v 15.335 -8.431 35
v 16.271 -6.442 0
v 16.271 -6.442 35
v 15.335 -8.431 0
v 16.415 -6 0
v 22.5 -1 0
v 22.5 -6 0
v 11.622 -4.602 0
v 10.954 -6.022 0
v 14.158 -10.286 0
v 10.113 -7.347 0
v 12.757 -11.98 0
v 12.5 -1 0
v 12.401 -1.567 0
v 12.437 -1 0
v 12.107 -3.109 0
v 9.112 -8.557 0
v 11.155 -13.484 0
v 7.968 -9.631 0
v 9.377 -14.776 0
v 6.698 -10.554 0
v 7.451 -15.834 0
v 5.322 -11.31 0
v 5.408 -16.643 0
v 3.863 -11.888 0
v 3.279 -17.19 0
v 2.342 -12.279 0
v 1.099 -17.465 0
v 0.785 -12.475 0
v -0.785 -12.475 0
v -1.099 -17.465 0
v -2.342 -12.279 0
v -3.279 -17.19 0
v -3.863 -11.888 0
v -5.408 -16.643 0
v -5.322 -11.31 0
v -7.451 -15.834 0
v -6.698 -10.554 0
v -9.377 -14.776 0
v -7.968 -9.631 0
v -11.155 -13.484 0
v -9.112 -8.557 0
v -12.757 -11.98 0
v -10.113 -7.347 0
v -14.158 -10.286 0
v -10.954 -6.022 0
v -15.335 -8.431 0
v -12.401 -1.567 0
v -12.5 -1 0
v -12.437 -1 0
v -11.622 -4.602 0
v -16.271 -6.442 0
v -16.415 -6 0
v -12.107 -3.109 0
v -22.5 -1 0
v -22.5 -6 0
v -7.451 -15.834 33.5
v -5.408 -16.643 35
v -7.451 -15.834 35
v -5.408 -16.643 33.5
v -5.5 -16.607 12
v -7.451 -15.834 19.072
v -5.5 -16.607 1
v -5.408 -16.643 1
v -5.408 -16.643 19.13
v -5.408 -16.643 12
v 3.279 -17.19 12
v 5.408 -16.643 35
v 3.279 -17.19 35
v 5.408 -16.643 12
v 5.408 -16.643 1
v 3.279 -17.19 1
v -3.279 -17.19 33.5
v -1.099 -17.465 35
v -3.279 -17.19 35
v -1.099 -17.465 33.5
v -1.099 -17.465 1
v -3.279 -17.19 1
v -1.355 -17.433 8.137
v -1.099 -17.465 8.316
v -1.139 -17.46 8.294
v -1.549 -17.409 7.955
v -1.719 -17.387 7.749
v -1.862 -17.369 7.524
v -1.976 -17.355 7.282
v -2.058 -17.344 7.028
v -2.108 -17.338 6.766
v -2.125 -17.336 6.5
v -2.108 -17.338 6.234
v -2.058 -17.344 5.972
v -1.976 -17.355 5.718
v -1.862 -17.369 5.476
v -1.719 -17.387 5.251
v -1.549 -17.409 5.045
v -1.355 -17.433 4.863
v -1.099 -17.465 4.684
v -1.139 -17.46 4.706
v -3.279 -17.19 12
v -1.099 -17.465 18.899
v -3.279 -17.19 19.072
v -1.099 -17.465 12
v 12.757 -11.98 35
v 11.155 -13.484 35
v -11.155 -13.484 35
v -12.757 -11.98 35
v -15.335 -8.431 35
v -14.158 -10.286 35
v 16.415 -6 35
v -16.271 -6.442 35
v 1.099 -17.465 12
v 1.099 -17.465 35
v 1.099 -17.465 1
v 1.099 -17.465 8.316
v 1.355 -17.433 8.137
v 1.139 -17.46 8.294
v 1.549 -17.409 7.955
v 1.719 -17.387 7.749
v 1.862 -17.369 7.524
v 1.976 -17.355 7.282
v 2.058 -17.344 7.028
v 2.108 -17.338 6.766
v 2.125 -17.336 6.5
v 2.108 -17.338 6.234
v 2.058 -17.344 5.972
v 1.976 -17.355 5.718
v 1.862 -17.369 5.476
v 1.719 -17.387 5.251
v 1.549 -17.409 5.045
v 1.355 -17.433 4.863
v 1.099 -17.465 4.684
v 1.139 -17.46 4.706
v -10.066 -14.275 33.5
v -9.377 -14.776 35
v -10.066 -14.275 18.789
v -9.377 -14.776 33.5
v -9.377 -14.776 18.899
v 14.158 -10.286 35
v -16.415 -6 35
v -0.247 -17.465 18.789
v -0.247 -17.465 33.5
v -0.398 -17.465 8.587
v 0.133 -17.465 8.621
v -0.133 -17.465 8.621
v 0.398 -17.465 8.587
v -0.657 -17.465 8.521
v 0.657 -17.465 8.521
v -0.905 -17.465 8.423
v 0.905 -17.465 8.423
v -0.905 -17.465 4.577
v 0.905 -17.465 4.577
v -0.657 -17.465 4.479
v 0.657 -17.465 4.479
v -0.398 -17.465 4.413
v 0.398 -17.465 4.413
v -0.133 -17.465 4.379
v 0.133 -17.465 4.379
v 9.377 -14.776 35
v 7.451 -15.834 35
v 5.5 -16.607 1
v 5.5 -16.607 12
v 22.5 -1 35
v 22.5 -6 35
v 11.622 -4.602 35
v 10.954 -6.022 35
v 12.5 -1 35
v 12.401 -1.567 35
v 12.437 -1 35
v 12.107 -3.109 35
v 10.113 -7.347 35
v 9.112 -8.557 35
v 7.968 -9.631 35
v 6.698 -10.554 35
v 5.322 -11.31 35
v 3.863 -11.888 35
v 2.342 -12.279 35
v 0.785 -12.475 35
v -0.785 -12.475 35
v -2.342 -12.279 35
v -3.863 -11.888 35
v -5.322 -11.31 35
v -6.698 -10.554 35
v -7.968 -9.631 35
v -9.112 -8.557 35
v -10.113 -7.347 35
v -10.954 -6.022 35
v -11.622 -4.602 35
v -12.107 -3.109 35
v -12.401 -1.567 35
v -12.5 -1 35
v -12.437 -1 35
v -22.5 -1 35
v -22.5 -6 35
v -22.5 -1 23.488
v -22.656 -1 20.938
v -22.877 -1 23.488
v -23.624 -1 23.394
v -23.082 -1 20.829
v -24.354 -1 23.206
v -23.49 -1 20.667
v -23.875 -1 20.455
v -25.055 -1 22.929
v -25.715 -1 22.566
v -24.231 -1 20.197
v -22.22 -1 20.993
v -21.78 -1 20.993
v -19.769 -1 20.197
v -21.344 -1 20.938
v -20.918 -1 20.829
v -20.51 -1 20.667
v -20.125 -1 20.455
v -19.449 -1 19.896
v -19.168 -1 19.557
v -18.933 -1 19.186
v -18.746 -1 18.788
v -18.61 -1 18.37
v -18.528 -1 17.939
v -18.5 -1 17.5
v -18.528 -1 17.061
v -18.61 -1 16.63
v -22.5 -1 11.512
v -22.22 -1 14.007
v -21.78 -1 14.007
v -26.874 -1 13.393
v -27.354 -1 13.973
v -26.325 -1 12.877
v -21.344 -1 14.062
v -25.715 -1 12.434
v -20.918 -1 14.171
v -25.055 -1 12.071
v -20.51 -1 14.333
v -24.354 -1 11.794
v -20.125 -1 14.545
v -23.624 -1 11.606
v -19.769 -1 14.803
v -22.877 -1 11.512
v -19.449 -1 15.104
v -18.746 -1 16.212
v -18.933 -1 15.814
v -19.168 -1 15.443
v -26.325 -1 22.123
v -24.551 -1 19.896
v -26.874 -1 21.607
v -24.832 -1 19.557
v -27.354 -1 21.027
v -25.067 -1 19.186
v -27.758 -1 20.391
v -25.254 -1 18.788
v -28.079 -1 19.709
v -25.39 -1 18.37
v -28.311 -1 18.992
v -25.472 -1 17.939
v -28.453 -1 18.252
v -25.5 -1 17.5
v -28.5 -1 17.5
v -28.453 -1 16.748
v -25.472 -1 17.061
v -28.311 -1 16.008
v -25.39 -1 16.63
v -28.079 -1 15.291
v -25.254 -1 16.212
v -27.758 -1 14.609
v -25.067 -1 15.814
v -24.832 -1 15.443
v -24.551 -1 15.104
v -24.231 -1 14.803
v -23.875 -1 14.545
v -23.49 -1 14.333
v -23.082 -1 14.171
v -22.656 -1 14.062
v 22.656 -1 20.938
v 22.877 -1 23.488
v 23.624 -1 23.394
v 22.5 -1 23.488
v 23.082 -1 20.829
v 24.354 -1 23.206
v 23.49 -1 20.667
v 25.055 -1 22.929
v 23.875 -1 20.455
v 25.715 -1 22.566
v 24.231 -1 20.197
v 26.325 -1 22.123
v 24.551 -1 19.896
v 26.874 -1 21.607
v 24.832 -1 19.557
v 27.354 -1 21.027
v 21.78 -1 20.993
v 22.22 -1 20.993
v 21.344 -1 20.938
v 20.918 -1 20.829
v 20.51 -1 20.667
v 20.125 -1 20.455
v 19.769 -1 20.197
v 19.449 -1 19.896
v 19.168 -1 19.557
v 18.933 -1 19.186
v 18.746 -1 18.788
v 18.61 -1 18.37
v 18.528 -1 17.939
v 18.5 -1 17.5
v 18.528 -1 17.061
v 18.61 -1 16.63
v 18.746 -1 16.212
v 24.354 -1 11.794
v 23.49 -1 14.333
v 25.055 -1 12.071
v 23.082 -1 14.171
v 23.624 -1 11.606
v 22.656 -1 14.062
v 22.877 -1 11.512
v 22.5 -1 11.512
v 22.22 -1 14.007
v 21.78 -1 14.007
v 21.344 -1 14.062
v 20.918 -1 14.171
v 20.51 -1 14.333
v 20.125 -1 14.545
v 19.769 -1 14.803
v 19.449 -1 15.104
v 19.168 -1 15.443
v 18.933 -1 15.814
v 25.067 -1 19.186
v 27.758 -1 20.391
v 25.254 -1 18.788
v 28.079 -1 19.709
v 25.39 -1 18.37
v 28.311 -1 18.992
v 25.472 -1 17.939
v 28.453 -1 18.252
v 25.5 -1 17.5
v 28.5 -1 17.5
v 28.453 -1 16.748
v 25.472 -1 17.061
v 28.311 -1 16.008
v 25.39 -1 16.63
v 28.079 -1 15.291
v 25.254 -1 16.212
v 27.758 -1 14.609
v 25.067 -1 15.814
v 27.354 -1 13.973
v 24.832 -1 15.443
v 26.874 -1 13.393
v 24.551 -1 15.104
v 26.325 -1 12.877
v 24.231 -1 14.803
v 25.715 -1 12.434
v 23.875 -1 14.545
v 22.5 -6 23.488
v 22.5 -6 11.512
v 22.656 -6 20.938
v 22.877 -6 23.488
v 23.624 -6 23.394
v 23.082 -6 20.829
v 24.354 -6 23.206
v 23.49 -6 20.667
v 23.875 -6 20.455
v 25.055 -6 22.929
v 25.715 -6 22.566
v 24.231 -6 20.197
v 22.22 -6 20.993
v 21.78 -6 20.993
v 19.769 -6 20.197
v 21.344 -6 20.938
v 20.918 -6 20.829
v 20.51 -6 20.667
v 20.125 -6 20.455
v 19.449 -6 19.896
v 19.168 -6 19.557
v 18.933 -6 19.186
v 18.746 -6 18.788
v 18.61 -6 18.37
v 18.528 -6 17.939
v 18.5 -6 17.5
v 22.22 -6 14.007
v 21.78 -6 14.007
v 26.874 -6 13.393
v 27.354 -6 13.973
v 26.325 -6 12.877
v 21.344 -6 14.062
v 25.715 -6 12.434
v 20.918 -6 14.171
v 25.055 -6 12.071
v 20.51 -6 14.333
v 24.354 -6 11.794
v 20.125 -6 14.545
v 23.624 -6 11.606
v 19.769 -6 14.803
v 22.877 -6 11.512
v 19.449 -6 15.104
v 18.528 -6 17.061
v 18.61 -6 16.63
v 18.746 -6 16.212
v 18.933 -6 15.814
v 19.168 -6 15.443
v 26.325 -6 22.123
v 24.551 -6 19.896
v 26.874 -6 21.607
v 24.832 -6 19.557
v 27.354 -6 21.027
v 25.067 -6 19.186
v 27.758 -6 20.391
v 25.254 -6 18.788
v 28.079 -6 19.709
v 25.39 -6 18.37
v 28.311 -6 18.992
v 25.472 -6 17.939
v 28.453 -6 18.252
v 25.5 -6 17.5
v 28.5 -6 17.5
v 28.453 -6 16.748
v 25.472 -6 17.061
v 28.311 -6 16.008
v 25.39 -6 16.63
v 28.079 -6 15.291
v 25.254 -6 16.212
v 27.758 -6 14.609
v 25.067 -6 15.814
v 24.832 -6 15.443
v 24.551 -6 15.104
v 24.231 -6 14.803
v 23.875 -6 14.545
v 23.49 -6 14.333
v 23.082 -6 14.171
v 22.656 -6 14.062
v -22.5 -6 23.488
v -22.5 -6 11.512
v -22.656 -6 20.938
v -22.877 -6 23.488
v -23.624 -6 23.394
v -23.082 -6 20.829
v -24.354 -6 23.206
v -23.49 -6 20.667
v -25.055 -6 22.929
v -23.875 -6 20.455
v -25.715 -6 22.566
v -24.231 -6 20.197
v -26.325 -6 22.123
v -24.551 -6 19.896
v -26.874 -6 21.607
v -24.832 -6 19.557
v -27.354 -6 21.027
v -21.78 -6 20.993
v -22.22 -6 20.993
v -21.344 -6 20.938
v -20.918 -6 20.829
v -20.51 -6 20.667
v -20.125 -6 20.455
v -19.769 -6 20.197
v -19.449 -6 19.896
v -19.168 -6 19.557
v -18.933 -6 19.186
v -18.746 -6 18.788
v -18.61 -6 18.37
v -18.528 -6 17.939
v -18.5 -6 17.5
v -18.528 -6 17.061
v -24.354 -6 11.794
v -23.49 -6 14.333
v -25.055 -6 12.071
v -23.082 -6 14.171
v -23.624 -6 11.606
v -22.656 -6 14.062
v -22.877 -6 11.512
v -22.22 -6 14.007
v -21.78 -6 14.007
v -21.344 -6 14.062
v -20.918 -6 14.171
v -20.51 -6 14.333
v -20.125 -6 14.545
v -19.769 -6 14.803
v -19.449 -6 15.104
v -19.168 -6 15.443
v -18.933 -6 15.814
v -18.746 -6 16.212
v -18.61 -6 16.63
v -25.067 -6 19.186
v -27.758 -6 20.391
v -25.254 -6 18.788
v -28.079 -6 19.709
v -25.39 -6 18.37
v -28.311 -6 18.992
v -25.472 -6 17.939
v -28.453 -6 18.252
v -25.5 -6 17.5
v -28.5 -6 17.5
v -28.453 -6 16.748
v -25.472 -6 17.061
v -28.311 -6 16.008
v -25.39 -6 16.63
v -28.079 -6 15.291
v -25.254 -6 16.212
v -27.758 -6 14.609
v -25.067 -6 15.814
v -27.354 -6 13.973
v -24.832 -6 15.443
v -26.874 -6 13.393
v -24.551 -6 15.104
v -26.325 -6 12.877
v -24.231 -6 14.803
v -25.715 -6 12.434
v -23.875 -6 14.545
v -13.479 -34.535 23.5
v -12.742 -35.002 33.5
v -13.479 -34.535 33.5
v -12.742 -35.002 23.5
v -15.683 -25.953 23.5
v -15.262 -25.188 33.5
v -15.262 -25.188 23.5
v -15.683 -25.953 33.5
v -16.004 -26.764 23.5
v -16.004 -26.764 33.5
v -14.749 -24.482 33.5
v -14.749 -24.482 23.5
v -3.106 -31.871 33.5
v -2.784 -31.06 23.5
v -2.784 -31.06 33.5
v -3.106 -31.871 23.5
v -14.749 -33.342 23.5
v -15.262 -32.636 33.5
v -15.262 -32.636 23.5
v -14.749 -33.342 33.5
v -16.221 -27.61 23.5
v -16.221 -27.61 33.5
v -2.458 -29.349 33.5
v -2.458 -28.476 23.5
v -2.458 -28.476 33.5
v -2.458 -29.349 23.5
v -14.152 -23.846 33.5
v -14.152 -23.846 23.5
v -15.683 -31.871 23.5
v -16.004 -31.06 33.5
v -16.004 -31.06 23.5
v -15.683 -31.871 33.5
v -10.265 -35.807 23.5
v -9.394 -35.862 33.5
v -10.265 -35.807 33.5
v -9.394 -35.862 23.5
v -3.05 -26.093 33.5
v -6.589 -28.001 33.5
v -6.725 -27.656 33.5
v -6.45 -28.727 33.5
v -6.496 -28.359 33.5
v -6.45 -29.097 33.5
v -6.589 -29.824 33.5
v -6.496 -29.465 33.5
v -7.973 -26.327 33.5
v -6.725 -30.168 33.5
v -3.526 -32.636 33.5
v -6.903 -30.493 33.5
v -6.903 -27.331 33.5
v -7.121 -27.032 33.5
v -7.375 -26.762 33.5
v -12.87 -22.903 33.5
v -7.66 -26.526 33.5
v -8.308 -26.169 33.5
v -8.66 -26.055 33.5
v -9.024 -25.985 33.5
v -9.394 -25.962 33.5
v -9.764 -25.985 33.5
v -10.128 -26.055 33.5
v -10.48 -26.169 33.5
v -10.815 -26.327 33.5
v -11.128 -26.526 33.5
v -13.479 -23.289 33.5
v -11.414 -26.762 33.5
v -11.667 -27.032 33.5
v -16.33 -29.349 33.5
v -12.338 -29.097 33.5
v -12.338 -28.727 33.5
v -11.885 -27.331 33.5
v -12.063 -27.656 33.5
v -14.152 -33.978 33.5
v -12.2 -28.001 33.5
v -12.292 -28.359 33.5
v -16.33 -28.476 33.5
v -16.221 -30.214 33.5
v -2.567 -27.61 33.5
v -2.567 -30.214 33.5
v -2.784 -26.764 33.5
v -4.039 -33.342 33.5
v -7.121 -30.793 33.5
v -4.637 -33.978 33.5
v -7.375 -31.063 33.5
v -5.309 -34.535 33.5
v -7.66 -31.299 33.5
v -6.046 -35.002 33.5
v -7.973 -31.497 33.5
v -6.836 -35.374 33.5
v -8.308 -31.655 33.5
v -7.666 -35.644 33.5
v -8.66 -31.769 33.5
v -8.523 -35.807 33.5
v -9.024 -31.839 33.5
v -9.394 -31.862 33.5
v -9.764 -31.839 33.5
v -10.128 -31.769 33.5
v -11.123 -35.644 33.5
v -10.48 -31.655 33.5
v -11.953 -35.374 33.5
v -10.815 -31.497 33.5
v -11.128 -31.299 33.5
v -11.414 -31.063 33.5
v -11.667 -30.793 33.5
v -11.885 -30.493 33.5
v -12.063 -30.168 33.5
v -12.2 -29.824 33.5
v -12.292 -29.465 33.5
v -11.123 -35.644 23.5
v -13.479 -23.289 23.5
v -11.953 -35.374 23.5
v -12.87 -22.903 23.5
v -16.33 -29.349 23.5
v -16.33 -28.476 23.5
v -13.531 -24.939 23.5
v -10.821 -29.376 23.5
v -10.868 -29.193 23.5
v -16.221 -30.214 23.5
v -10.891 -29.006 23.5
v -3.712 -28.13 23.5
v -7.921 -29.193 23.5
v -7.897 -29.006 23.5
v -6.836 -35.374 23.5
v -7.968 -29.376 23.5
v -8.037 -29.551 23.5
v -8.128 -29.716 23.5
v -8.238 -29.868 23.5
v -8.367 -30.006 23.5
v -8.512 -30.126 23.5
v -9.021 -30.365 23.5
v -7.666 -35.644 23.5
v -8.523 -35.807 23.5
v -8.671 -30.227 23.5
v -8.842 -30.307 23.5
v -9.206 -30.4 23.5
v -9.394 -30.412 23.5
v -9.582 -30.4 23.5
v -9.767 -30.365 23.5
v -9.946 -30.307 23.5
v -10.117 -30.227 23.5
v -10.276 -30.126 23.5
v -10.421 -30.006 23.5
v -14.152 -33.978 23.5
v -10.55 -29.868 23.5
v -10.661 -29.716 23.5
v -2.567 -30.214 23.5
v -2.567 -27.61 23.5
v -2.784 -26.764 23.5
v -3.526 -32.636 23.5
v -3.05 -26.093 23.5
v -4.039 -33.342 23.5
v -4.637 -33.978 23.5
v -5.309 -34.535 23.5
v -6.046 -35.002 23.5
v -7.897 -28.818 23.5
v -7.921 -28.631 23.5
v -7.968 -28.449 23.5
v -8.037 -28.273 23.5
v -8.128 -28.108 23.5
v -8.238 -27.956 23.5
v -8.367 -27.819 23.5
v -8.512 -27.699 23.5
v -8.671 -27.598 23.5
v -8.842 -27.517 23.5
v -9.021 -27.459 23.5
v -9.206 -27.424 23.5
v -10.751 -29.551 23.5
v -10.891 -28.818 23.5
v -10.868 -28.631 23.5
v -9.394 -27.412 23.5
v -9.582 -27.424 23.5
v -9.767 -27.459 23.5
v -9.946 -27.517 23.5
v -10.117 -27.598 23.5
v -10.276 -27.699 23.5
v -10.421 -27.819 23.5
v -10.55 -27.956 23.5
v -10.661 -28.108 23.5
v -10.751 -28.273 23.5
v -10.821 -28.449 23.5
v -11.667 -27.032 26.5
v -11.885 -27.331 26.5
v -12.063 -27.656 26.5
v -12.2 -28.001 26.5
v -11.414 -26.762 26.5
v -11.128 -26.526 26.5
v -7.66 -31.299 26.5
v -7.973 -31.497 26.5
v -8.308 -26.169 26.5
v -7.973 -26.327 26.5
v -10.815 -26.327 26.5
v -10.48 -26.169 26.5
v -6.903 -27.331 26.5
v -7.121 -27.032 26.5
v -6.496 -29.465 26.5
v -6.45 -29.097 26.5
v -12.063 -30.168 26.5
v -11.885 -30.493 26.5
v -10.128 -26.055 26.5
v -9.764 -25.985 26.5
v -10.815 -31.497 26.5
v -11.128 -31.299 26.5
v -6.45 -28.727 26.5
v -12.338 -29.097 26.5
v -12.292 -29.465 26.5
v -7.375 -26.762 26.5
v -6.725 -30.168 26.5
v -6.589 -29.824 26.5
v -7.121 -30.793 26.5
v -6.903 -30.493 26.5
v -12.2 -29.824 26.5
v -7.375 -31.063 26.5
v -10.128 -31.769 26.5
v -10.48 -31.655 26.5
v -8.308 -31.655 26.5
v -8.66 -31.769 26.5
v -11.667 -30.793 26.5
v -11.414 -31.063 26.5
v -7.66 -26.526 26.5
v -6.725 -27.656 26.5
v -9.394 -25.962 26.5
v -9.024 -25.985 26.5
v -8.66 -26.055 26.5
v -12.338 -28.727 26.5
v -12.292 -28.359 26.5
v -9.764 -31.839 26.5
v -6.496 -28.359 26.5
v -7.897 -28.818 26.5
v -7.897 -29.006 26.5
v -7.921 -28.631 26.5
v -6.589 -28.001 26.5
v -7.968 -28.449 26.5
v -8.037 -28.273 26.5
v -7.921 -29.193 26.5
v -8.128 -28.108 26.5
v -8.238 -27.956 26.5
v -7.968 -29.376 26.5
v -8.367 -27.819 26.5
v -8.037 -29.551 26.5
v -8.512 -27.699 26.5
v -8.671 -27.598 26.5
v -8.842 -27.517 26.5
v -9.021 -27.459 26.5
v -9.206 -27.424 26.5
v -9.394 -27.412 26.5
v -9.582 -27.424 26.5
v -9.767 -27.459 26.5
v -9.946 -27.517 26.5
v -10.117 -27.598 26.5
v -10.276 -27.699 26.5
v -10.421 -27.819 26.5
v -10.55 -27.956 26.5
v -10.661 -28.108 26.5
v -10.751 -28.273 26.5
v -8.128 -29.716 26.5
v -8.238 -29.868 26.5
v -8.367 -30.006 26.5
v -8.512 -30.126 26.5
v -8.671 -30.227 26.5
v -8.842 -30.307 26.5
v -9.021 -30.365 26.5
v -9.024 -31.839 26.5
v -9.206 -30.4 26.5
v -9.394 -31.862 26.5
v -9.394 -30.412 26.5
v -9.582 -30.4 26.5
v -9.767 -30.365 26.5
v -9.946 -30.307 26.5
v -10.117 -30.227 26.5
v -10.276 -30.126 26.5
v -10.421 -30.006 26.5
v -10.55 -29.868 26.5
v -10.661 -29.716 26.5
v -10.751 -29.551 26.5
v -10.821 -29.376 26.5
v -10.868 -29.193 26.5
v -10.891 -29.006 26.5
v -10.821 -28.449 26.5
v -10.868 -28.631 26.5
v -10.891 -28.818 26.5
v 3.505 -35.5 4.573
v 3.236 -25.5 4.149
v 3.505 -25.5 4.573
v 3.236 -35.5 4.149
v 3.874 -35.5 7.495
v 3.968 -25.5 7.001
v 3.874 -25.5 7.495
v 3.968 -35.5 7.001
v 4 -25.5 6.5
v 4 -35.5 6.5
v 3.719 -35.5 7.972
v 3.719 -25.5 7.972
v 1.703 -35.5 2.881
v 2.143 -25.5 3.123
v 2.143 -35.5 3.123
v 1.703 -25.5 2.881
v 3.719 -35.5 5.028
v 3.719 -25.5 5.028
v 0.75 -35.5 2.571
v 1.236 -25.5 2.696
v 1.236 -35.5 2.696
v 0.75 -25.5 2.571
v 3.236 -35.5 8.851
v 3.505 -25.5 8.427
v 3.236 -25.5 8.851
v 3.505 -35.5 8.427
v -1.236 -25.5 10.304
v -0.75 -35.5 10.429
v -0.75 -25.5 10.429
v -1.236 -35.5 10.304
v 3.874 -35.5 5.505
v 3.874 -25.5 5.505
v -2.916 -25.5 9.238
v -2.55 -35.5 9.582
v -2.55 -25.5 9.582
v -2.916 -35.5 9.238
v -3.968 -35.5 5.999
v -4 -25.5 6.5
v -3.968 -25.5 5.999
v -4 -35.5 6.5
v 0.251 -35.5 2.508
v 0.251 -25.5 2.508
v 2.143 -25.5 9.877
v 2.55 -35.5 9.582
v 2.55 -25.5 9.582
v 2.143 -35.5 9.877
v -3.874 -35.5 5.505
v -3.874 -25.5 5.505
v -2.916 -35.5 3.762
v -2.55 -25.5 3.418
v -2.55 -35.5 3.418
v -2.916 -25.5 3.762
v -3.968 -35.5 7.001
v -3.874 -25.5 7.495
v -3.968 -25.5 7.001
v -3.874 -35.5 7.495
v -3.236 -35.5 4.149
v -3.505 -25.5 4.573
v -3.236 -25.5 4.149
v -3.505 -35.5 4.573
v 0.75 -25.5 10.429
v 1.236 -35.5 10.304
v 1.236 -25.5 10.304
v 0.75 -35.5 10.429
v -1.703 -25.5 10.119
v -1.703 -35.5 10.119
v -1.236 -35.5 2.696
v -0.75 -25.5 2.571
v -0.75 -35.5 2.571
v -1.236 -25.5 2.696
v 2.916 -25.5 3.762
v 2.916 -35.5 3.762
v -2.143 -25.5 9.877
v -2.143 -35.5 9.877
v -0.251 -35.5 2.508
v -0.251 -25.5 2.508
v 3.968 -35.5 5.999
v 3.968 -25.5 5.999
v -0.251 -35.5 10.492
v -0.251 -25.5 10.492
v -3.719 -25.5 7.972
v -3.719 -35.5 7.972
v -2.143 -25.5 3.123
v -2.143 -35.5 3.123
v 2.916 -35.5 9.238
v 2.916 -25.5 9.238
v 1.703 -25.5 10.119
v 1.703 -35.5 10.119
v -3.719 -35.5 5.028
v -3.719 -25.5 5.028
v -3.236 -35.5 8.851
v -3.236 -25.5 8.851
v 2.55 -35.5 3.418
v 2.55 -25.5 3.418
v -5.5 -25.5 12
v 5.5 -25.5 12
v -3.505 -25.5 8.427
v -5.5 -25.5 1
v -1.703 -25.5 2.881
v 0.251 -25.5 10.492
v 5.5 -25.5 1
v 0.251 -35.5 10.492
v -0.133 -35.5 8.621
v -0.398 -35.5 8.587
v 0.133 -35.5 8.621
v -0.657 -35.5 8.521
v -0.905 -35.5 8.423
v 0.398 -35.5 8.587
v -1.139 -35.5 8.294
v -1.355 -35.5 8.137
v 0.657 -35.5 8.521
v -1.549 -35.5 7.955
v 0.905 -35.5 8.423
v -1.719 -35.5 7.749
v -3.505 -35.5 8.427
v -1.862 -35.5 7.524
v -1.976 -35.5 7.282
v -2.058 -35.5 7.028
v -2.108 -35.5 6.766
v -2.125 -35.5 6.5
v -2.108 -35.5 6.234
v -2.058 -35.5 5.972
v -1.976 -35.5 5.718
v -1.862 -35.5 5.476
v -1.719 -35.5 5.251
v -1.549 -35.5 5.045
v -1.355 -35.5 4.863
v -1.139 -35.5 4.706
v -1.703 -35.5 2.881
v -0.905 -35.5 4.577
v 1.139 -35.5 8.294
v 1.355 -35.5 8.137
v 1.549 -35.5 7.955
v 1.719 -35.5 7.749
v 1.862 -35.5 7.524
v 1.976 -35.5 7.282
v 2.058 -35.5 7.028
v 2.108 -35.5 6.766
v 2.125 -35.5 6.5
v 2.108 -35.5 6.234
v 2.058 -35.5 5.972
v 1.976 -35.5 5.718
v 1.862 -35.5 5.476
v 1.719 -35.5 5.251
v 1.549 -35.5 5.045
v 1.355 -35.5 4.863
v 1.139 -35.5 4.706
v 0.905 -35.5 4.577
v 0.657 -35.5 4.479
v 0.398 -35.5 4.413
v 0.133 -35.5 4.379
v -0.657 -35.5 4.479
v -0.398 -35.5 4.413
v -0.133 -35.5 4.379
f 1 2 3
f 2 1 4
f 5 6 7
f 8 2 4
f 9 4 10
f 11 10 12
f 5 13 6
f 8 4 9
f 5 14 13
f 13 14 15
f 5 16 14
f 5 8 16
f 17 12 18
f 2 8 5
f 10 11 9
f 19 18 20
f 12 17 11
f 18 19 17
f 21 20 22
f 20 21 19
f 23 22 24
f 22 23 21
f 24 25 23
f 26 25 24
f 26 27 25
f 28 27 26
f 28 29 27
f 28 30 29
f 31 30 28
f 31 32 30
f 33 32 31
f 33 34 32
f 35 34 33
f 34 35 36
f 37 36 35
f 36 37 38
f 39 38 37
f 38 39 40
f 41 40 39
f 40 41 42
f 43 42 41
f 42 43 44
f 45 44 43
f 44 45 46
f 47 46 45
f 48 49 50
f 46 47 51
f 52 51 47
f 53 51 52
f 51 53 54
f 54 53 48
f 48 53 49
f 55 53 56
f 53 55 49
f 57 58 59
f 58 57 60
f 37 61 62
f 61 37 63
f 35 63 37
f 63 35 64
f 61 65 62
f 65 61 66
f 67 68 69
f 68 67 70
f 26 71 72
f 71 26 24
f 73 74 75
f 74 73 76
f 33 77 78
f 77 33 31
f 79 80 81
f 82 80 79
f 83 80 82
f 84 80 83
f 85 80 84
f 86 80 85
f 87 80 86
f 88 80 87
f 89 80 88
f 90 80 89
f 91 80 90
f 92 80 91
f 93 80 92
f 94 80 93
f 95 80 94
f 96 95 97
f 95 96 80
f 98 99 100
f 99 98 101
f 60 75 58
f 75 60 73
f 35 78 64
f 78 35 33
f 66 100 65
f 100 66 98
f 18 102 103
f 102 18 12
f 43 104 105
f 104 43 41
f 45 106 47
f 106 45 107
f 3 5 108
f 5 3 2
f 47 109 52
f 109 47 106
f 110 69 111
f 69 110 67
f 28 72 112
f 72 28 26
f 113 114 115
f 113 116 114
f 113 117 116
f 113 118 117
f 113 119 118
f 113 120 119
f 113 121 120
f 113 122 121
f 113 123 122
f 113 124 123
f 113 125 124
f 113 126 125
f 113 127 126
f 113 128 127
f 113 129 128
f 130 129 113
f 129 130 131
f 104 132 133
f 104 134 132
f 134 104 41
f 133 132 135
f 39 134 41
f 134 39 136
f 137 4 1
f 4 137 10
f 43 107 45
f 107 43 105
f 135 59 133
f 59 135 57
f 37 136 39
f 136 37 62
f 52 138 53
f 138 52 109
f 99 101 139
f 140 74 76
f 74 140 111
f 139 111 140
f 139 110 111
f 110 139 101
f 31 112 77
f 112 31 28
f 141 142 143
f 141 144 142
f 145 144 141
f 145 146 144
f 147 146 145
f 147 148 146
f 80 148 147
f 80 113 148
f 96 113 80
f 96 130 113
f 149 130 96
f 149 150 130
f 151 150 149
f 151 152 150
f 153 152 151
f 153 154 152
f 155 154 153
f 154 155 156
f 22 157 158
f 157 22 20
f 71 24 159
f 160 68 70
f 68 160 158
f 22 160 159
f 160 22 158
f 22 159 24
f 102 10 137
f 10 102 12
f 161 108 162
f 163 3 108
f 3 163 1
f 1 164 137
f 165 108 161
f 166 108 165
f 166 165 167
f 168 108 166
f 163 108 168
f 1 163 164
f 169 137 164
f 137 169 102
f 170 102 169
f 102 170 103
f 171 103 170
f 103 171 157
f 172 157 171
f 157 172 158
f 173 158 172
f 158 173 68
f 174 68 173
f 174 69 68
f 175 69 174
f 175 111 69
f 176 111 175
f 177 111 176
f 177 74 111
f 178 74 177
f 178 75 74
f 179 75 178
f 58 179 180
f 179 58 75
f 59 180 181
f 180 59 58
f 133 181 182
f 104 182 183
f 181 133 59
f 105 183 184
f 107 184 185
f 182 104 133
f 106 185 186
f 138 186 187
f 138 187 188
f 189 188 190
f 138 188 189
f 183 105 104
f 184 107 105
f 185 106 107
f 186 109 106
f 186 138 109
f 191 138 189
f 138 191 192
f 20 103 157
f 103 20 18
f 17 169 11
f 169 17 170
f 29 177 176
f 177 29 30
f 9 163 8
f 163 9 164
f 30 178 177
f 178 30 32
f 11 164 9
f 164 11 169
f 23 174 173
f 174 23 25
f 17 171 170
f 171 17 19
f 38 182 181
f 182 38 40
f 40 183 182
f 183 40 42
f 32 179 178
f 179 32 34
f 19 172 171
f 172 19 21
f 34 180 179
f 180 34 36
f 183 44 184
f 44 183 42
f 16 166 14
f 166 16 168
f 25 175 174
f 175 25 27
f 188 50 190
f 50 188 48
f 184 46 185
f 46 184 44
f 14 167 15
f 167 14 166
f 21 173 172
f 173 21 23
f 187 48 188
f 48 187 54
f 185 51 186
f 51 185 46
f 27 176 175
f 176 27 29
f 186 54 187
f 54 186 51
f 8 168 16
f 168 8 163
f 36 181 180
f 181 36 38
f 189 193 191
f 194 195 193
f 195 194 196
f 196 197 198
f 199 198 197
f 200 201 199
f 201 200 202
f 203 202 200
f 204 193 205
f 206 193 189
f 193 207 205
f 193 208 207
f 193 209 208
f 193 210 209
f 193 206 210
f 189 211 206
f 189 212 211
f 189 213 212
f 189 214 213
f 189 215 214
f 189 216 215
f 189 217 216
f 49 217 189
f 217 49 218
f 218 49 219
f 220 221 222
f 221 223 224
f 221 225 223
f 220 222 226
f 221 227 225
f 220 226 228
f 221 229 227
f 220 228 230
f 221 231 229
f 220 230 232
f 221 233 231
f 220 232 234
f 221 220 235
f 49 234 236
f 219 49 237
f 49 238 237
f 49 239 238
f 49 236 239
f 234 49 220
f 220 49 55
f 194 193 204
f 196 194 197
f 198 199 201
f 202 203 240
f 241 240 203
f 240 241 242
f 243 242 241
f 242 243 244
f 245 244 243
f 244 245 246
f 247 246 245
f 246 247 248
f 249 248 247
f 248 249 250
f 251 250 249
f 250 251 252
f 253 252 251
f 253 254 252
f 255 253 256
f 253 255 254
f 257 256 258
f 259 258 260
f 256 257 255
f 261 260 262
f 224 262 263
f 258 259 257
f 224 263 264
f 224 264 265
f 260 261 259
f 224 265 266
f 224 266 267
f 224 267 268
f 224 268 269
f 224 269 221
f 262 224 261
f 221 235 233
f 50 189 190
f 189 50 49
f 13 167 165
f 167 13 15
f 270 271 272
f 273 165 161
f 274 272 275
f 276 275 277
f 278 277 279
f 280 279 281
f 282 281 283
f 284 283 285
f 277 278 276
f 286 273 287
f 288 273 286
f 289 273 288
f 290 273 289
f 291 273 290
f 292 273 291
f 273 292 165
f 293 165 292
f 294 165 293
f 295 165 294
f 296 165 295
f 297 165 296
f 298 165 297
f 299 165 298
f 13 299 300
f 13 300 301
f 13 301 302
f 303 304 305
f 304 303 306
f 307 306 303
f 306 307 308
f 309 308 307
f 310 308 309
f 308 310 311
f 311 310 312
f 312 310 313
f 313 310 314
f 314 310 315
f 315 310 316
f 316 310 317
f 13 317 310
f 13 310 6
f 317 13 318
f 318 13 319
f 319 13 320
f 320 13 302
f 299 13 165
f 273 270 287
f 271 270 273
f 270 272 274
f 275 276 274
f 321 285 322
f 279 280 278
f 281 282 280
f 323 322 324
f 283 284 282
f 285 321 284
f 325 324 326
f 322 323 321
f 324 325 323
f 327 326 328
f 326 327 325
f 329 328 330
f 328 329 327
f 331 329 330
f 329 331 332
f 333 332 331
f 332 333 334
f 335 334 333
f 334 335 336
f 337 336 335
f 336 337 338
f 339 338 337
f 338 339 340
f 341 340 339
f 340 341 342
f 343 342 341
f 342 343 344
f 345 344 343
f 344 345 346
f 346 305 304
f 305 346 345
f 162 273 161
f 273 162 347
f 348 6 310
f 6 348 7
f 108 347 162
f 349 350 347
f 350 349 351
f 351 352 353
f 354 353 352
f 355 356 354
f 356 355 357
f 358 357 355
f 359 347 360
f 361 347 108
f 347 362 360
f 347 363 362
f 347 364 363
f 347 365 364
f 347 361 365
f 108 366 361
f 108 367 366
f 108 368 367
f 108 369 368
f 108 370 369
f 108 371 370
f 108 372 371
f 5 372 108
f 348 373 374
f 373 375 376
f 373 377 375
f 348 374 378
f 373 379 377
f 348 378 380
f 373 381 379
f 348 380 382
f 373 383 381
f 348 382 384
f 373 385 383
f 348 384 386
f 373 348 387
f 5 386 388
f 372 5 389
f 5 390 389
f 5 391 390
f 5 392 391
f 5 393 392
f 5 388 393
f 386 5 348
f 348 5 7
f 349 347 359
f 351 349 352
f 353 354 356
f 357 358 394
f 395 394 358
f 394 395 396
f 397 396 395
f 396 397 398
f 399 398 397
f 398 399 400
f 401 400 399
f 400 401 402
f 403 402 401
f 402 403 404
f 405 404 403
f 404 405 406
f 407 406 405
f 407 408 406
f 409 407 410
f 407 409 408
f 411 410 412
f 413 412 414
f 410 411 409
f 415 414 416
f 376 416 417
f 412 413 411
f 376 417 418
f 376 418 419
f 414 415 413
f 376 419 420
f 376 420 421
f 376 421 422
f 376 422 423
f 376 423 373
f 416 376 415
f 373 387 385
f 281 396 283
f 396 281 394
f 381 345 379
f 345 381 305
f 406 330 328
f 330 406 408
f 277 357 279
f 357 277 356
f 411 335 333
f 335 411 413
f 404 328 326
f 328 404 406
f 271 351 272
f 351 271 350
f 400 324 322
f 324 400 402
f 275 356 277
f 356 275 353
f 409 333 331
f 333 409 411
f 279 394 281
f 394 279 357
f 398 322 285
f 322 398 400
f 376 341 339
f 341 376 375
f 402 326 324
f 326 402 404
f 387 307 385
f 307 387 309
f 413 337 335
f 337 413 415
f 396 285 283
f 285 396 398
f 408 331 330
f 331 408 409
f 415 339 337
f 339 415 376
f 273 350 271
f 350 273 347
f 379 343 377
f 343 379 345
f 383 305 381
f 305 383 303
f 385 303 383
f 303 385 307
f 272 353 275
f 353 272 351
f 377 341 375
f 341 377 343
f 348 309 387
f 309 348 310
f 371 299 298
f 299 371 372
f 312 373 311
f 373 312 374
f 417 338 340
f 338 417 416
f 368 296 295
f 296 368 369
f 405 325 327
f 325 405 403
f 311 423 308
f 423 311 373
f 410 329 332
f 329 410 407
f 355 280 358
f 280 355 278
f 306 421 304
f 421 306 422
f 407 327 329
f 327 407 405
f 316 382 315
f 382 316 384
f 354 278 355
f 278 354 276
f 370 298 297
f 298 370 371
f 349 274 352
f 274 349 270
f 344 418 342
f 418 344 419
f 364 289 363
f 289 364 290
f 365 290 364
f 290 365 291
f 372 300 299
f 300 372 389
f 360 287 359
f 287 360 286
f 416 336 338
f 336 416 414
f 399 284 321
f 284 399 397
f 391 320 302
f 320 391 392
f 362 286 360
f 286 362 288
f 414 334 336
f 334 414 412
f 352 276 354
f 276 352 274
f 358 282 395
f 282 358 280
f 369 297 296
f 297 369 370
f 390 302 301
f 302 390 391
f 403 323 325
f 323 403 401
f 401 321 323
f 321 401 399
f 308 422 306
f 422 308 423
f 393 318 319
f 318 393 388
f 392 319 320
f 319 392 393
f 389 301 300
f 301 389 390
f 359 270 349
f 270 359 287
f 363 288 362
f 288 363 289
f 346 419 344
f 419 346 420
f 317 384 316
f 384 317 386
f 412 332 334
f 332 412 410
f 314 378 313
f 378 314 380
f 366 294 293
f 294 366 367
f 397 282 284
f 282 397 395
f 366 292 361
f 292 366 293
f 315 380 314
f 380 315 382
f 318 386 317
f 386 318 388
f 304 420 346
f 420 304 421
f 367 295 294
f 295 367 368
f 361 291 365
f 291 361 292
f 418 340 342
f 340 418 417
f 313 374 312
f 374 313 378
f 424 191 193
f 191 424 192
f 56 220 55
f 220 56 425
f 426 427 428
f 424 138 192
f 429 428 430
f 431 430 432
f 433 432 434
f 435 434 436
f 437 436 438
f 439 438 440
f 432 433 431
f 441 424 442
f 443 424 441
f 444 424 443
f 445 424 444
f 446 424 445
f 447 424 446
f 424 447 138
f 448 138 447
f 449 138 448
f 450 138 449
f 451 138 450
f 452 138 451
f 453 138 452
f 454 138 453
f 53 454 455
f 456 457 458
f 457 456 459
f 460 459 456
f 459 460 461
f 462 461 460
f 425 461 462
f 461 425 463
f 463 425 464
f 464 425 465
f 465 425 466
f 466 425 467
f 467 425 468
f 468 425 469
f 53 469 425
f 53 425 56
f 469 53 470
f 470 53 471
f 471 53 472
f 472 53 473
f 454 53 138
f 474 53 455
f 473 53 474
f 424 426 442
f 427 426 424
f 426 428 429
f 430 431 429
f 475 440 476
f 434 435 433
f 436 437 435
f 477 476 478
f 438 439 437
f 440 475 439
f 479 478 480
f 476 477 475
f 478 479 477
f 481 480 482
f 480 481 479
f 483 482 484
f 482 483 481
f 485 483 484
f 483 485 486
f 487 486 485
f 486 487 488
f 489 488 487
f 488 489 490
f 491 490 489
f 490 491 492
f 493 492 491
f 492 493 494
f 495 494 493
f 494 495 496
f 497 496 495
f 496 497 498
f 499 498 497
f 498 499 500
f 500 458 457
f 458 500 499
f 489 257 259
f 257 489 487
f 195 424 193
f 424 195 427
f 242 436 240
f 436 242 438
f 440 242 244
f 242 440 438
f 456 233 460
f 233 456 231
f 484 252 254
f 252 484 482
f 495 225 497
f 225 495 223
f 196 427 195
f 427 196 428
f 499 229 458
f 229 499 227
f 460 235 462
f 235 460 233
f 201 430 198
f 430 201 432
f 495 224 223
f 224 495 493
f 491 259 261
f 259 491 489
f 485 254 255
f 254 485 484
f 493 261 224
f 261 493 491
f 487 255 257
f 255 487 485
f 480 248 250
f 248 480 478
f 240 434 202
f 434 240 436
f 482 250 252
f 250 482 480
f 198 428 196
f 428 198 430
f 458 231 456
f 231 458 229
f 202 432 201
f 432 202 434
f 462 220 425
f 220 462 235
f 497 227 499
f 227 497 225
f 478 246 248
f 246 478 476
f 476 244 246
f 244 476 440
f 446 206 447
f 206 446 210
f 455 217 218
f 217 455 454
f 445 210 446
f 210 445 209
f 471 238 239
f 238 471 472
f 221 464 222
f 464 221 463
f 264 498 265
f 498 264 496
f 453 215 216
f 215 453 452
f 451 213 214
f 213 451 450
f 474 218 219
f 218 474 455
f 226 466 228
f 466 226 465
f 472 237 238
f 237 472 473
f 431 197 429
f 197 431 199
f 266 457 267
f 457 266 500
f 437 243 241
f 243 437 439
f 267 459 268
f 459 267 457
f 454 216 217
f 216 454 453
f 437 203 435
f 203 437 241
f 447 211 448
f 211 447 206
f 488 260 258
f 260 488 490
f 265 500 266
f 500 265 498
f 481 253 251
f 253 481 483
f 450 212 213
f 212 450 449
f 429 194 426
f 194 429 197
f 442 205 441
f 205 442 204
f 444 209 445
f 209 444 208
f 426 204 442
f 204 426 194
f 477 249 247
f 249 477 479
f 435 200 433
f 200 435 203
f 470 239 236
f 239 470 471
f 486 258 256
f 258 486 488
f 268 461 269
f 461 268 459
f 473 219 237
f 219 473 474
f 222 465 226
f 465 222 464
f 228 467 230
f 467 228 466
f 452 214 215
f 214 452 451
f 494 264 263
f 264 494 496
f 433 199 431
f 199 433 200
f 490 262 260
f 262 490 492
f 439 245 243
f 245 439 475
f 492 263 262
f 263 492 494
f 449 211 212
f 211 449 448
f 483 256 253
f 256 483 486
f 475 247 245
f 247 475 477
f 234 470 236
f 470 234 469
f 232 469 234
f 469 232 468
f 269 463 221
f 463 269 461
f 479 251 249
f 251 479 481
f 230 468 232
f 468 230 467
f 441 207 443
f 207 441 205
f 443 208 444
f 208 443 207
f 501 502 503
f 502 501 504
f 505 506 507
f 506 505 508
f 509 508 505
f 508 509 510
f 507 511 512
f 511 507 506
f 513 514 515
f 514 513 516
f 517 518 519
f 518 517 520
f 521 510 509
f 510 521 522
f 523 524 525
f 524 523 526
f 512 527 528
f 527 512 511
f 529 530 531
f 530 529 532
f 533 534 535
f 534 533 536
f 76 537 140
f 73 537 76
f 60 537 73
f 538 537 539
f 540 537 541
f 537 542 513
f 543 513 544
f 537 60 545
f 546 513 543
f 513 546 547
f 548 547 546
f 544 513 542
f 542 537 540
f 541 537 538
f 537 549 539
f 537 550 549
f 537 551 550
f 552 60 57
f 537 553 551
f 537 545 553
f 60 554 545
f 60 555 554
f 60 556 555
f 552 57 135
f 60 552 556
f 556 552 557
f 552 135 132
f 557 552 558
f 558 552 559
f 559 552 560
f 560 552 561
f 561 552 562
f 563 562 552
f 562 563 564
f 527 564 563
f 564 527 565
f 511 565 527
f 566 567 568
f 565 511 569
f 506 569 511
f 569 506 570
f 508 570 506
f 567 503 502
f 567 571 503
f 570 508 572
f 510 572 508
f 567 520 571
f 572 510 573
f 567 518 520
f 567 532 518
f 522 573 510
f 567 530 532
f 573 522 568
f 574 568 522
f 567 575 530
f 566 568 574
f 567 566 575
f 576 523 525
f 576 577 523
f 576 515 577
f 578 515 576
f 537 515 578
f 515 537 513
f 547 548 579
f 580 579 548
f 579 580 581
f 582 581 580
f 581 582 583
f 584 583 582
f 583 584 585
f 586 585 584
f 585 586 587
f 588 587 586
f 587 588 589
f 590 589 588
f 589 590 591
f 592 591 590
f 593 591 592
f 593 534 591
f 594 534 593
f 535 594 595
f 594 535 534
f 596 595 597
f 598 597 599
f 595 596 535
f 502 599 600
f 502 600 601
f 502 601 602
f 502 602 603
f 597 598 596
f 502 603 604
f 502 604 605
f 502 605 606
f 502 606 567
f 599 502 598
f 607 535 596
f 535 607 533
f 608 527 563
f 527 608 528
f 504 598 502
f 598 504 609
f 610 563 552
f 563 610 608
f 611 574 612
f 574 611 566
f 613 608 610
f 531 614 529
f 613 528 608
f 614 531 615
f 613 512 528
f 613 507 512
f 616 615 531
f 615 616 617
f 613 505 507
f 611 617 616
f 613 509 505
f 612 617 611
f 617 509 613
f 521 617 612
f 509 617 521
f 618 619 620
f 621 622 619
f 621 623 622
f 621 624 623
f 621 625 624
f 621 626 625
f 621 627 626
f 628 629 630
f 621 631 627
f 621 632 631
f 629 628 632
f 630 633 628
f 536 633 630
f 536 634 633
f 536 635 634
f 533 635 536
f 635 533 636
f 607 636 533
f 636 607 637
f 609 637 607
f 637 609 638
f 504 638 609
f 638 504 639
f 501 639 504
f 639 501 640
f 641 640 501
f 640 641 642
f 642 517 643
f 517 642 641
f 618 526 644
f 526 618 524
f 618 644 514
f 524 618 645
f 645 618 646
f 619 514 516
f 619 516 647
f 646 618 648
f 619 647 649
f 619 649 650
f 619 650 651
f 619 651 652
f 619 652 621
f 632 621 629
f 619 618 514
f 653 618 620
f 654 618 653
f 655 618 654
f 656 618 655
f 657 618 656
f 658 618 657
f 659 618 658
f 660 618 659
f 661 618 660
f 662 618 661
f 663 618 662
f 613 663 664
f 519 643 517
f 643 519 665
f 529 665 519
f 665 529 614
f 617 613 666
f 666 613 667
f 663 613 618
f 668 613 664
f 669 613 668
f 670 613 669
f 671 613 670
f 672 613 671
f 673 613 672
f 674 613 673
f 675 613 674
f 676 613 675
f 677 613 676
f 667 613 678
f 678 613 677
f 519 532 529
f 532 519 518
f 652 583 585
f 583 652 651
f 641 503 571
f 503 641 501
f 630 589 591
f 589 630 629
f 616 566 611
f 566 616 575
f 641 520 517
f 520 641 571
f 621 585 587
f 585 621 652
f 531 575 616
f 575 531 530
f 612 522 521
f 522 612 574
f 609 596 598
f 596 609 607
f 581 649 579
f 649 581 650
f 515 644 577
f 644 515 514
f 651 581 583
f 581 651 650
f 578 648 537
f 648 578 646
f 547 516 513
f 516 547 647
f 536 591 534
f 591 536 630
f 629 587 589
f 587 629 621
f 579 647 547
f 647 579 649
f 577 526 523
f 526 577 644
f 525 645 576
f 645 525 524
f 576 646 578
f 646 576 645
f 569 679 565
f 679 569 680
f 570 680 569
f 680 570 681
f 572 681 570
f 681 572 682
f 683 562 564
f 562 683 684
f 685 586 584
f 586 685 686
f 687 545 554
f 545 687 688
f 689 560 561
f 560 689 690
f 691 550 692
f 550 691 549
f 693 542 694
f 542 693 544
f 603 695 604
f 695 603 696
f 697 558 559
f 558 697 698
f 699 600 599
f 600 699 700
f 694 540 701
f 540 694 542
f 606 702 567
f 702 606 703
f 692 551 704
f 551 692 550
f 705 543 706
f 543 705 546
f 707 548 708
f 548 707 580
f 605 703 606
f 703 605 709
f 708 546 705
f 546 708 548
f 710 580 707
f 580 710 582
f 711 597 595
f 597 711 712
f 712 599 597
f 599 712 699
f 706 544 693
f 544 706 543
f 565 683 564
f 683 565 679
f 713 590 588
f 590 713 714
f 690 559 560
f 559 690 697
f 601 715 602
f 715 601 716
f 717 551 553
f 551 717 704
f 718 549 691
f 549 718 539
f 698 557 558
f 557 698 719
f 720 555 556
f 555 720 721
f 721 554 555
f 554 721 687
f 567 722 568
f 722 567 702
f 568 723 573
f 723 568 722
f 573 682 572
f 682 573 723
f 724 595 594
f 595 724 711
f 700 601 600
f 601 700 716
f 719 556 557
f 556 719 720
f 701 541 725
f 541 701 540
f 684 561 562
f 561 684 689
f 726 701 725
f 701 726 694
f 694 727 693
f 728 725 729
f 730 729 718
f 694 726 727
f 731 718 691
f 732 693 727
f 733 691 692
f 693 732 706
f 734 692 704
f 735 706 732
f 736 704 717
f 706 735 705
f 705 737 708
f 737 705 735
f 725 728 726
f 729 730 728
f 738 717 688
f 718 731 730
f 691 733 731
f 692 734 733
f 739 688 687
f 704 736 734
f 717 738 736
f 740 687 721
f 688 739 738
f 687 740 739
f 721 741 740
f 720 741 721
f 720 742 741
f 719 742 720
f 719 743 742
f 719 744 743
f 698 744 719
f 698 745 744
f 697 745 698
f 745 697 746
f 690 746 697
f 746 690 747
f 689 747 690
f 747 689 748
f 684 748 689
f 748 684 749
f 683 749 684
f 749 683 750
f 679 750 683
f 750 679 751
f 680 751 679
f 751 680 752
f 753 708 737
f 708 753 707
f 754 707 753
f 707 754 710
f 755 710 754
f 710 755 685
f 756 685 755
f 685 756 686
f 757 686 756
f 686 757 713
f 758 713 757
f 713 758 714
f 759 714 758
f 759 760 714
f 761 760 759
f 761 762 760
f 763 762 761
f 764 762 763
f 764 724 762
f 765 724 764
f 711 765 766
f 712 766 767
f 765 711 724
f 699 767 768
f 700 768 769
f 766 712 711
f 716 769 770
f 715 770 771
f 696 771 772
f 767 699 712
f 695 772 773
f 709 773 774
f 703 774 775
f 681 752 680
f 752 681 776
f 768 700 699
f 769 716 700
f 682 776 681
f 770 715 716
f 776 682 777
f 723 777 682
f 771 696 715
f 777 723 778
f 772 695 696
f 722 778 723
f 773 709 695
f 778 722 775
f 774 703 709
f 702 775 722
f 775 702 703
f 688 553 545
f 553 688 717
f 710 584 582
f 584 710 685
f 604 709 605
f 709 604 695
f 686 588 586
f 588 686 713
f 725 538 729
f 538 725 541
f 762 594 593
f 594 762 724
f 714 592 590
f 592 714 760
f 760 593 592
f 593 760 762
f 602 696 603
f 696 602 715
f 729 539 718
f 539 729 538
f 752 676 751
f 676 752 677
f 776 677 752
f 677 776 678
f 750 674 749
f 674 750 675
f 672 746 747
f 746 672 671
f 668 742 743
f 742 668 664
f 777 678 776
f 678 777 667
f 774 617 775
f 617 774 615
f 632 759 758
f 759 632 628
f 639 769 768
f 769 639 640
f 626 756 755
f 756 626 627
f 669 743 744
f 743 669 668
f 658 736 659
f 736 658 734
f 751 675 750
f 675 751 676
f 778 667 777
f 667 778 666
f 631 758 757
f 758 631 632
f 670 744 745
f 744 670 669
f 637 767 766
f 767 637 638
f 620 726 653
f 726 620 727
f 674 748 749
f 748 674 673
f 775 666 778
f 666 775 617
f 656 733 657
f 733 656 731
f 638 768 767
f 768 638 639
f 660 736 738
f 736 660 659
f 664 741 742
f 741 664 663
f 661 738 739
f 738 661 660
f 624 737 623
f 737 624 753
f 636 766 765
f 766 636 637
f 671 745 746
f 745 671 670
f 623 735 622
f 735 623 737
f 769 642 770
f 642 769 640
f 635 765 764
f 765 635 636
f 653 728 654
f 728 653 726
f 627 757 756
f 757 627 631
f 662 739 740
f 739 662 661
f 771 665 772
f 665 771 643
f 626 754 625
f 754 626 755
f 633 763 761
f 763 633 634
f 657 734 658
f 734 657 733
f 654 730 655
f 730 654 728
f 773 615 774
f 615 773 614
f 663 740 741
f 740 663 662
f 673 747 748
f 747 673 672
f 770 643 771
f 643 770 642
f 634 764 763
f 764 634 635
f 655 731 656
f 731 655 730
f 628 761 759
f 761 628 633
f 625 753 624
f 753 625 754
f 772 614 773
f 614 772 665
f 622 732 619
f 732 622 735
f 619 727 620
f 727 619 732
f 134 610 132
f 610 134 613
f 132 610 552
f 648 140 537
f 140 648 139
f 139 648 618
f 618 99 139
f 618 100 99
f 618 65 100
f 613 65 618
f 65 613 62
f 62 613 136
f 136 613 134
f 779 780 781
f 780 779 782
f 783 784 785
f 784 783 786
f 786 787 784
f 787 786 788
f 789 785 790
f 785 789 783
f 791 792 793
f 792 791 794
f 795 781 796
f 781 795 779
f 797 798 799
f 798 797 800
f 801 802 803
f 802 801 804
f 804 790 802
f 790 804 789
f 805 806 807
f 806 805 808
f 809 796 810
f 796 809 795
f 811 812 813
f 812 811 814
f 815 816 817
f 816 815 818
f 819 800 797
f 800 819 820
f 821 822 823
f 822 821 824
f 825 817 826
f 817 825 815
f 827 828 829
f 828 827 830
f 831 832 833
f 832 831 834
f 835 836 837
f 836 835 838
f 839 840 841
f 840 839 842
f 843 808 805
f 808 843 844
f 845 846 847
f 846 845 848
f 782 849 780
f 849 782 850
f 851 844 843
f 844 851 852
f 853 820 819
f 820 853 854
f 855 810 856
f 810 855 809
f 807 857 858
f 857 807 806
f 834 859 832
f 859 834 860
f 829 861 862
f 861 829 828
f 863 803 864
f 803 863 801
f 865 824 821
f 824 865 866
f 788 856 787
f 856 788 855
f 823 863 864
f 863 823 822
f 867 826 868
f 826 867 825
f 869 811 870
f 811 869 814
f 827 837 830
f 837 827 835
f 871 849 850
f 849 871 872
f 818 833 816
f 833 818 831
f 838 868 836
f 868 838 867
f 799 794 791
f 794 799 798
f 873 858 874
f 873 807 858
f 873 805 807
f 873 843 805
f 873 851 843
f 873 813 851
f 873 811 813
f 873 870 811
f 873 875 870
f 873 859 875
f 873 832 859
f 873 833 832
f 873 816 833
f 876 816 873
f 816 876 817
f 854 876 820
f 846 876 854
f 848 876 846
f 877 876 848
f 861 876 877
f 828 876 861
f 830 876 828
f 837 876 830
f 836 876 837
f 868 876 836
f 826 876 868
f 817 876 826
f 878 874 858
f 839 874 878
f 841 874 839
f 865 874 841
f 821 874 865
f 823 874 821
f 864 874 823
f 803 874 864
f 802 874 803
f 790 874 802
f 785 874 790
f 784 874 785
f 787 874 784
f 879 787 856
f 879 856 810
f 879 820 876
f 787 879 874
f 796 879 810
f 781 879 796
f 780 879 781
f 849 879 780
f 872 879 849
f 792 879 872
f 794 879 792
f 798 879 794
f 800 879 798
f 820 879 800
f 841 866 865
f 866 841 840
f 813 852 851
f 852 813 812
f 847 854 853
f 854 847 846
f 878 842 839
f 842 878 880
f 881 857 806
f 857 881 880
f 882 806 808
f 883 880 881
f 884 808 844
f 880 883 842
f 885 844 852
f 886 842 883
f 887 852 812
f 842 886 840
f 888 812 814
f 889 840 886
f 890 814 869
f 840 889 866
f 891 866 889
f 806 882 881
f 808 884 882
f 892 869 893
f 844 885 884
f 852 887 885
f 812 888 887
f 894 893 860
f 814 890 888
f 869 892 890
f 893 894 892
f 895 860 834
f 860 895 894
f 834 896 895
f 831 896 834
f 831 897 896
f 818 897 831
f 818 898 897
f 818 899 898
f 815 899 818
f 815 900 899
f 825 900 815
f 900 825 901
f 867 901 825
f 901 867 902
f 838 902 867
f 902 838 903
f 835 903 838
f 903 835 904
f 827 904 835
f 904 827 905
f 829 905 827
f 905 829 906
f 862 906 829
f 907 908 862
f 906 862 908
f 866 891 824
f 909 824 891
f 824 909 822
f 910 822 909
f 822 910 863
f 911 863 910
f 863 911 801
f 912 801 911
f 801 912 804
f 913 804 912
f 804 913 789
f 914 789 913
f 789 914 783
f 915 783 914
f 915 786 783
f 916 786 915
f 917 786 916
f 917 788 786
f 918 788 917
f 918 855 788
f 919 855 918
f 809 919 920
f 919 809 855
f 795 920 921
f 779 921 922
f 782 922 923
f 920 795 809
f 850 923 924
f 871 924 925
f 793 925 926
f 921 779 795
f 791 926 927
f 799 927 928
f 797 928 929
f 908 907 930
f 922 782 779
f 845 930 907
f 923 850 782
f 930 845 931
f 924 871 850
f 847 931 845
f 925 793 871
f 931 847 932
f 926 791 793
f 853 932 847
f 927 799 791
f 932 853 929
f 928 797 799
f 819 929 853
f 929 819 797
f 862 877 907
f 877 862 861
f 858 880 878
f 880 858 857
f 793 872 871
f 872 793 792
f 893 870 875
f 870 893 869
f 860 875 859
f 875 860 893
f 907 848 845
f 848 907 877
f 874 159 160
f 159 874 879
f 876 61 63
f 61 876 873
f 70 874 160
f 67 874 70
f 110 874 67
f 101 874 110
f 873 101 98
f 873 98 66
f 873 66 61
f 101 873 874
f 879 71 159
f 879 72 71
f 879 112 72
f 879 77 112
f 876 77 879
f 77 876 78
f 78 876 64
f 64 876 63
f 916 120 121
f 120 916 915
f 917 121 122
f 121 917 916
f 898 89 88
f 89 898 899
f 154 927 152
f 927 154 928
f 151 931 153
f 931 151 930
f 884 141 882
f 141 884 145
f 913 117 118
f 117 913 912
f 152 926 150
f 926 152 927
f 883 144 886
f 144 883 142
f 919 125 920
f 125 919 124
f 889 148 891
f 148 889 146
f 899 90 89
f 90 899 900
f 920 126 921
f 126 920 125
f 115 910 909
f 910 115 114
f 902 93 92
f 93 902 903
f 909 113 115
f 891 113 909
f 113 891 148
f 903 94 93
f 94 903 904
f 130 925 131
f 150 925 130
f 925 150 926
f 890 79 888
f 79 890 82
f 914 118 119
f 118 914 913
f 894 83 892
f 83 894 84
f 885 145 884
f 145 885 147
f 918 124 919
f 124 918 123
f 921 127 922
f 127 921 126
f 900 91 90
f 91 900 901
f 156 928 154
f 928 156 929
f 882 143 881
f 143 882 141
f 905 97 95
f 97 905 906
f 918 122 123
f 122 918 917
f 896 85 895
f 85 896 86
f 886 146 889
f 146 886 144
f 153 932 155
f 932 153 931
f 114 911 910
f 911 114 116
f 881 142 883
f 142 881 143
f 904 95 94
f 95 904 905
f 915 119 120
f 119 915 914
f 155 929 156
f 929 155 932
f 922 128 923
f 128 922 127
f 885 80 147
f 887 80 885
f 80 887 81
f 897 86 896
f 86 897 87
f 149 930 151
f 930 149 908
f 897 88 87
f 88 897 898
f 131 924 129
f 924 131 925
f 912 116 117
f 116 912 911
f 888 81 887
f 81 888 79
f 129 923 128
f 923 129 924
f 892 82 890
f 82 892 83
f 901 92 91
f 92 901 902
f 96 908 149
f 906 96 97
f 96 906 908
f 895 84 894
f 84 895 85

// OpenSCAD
$fn=50;
//Generate the shifter block
gen_shifter =  true;

//Generate the cable stop
gen_CableStop = true;

//Generate Support for Cable Stop
gen_cblStp_support = true;

// The radius of the bar the bracket should fit.
bar_r = 12.5;

//The height of the bracket
bracket_height = 35;
// 3mm diameter hole
hinge_hole_rad = 1.8;

// 6.5mm diameter hole
clasp_hole_rad = 3.5;

//Cable stop offset in Degress
cblStp_off = -18;

//Radius of the Cable Stop hole
cblStp_r = 2.95;

//thickness to make cableStop
cblStp_h = 10;

//How far Cable stop should stick out
cblStp_out = 9;

//Amount the support bracket for the cable stop should extend downwards
cblStp_Sprt_height = cblStp_h / 2;

//Depth of the shifter base
shft_base_depth = 8;

//Side Length of shifter Base
shft_base_h = 11;

//Radius of hole for shifter base
shft_hole_r = 2.125;

//Radius of the peg on shifter
shft_peg_r = 4;

//length of the peg on shifter
shft_peg_l = 10;
module Bracket()
{
	// bracket
	union()
	{
		// half moon shape
		difference()
		{
			cylinder(bracket_height, bar_r + 5, bar_r + 5);
			translate([0,0,-10]) cylinder(bracket_height + 15, bar_r, bar_r);
			translate([-((bar_r  * 3) / 2),-1,-15]) cube([bar_r * 3,bar_r * 3,bracket_height+20]);
			//translate([bar_r - 3.5,-7,6]) cube([10,6,16]);	
		}

		// hinge tab
		difference()
		{
	//		translate([bar_r + 7,0,0]) cylinder(6,7,7);
	//		translate([bar_r + 7,0,-5]) cylinder(20,hinge_hole_rad,hinge_hole_rad);
            union()
			{
				translate([(bar_r),-6,0]) cube([10,5,bracket_height]);
				translate([(bar_r + 10),-1,bracket_height / 2]) rotate([90,0,0]) cylinder(5,6,6);
			}

			translate([(bar_r + 9.5),10,bracket_height / 2]) rotate([90,0,0]) cylinder(20,clasp_hole_rad,clasp_hole_rad);
            }

		// clasp tab
		difference()
		{
			union()
			{
				translate([-(bar_r + 10),-6,0]) cube([10,5,bracket_height]);
				translate([-(bar_r + 10),-1,bracket_height / 2]) rotate([90,0,0]) cylinder(5,6,6);
			}

			translate([-(bar_r + 9.5),10, bracket_height / 2]) rotate([90,0,0]) cylinder(20,clasp_hole_rad,clasp_hole_rad);
		}
	}
}


module CableStop(rotation, x,y,z)
{
   
    translate([x,y,z]) rotate(rotation)
        union()
        {
            translate([-(1.75 * cblStp_r), (cblStp_out  /2 ) - 1, 0])  cube([3.5 * cblStp_r, cblStp_out + 2, cblStp_h]);
            if (gen_cblStp_support)
            {
                l = cblStp_r * 3.5;
                w = 1.1 * cblStp_out + 2;
                h = cblStp_Sprt_height;
                translate([-(1.75 * cblStp_r), (cblStp_out  /2 ) - 2, cblStp_h]) polyhedron(
                   points=[[0,0,0], [l,0,0], [l,w,0], [0,w,0], [0,w,h], [l,w,h]],
                   faces=[[0,1,2,3],[5,4,3,2],[0,4,5,1],[0,3,4],[5,2,1]]
                   );
            }
            difference()
            {
                cylinder(cblStp_h, cblStp_r + 4, cblStp_r + 4);
                cylinder(cblStp_h - 3, cblStp_r,cblStp_r);
                cylinder(cblStp_h, 1.5 , 1.5);
            }
        }
}


module ShifterBlock(rotation,location)
{
     translate(location) rotate(rotation) 
        difference()
        {
            union()
            {
                cylinder(shft_peg_l, shft_peg_r,shft_peg_r);
                translate([0,0,-((shft_base_depth + 1.5) / 2)]) cube([shft_base_h,shft_base_h , shft_base_depth + 1.5], true);
            }
            translate([0,0, -(shft_base_depth+1.5)]) cylinder(shft_peg_l + shft_base_depth + 2, shft_hole_r, shft_hole_r);
        }    
}

Bracket();
if (gen_CableStop)
{
    color("green", 1.0) rotate(cblStp_off, [0,0,1]) CableStop([0,180,0],0, -(bar_r + cblStp_out + (2 * (cblStp_r + 2)) - 1),bracket_height - 1.5);
}
if (gen_shifter)
{
    ShifterBlock([90,0,0],[0,-(bar_r + shft_base_depth + 5), (shft_base_h / 2)+1]); 
}
